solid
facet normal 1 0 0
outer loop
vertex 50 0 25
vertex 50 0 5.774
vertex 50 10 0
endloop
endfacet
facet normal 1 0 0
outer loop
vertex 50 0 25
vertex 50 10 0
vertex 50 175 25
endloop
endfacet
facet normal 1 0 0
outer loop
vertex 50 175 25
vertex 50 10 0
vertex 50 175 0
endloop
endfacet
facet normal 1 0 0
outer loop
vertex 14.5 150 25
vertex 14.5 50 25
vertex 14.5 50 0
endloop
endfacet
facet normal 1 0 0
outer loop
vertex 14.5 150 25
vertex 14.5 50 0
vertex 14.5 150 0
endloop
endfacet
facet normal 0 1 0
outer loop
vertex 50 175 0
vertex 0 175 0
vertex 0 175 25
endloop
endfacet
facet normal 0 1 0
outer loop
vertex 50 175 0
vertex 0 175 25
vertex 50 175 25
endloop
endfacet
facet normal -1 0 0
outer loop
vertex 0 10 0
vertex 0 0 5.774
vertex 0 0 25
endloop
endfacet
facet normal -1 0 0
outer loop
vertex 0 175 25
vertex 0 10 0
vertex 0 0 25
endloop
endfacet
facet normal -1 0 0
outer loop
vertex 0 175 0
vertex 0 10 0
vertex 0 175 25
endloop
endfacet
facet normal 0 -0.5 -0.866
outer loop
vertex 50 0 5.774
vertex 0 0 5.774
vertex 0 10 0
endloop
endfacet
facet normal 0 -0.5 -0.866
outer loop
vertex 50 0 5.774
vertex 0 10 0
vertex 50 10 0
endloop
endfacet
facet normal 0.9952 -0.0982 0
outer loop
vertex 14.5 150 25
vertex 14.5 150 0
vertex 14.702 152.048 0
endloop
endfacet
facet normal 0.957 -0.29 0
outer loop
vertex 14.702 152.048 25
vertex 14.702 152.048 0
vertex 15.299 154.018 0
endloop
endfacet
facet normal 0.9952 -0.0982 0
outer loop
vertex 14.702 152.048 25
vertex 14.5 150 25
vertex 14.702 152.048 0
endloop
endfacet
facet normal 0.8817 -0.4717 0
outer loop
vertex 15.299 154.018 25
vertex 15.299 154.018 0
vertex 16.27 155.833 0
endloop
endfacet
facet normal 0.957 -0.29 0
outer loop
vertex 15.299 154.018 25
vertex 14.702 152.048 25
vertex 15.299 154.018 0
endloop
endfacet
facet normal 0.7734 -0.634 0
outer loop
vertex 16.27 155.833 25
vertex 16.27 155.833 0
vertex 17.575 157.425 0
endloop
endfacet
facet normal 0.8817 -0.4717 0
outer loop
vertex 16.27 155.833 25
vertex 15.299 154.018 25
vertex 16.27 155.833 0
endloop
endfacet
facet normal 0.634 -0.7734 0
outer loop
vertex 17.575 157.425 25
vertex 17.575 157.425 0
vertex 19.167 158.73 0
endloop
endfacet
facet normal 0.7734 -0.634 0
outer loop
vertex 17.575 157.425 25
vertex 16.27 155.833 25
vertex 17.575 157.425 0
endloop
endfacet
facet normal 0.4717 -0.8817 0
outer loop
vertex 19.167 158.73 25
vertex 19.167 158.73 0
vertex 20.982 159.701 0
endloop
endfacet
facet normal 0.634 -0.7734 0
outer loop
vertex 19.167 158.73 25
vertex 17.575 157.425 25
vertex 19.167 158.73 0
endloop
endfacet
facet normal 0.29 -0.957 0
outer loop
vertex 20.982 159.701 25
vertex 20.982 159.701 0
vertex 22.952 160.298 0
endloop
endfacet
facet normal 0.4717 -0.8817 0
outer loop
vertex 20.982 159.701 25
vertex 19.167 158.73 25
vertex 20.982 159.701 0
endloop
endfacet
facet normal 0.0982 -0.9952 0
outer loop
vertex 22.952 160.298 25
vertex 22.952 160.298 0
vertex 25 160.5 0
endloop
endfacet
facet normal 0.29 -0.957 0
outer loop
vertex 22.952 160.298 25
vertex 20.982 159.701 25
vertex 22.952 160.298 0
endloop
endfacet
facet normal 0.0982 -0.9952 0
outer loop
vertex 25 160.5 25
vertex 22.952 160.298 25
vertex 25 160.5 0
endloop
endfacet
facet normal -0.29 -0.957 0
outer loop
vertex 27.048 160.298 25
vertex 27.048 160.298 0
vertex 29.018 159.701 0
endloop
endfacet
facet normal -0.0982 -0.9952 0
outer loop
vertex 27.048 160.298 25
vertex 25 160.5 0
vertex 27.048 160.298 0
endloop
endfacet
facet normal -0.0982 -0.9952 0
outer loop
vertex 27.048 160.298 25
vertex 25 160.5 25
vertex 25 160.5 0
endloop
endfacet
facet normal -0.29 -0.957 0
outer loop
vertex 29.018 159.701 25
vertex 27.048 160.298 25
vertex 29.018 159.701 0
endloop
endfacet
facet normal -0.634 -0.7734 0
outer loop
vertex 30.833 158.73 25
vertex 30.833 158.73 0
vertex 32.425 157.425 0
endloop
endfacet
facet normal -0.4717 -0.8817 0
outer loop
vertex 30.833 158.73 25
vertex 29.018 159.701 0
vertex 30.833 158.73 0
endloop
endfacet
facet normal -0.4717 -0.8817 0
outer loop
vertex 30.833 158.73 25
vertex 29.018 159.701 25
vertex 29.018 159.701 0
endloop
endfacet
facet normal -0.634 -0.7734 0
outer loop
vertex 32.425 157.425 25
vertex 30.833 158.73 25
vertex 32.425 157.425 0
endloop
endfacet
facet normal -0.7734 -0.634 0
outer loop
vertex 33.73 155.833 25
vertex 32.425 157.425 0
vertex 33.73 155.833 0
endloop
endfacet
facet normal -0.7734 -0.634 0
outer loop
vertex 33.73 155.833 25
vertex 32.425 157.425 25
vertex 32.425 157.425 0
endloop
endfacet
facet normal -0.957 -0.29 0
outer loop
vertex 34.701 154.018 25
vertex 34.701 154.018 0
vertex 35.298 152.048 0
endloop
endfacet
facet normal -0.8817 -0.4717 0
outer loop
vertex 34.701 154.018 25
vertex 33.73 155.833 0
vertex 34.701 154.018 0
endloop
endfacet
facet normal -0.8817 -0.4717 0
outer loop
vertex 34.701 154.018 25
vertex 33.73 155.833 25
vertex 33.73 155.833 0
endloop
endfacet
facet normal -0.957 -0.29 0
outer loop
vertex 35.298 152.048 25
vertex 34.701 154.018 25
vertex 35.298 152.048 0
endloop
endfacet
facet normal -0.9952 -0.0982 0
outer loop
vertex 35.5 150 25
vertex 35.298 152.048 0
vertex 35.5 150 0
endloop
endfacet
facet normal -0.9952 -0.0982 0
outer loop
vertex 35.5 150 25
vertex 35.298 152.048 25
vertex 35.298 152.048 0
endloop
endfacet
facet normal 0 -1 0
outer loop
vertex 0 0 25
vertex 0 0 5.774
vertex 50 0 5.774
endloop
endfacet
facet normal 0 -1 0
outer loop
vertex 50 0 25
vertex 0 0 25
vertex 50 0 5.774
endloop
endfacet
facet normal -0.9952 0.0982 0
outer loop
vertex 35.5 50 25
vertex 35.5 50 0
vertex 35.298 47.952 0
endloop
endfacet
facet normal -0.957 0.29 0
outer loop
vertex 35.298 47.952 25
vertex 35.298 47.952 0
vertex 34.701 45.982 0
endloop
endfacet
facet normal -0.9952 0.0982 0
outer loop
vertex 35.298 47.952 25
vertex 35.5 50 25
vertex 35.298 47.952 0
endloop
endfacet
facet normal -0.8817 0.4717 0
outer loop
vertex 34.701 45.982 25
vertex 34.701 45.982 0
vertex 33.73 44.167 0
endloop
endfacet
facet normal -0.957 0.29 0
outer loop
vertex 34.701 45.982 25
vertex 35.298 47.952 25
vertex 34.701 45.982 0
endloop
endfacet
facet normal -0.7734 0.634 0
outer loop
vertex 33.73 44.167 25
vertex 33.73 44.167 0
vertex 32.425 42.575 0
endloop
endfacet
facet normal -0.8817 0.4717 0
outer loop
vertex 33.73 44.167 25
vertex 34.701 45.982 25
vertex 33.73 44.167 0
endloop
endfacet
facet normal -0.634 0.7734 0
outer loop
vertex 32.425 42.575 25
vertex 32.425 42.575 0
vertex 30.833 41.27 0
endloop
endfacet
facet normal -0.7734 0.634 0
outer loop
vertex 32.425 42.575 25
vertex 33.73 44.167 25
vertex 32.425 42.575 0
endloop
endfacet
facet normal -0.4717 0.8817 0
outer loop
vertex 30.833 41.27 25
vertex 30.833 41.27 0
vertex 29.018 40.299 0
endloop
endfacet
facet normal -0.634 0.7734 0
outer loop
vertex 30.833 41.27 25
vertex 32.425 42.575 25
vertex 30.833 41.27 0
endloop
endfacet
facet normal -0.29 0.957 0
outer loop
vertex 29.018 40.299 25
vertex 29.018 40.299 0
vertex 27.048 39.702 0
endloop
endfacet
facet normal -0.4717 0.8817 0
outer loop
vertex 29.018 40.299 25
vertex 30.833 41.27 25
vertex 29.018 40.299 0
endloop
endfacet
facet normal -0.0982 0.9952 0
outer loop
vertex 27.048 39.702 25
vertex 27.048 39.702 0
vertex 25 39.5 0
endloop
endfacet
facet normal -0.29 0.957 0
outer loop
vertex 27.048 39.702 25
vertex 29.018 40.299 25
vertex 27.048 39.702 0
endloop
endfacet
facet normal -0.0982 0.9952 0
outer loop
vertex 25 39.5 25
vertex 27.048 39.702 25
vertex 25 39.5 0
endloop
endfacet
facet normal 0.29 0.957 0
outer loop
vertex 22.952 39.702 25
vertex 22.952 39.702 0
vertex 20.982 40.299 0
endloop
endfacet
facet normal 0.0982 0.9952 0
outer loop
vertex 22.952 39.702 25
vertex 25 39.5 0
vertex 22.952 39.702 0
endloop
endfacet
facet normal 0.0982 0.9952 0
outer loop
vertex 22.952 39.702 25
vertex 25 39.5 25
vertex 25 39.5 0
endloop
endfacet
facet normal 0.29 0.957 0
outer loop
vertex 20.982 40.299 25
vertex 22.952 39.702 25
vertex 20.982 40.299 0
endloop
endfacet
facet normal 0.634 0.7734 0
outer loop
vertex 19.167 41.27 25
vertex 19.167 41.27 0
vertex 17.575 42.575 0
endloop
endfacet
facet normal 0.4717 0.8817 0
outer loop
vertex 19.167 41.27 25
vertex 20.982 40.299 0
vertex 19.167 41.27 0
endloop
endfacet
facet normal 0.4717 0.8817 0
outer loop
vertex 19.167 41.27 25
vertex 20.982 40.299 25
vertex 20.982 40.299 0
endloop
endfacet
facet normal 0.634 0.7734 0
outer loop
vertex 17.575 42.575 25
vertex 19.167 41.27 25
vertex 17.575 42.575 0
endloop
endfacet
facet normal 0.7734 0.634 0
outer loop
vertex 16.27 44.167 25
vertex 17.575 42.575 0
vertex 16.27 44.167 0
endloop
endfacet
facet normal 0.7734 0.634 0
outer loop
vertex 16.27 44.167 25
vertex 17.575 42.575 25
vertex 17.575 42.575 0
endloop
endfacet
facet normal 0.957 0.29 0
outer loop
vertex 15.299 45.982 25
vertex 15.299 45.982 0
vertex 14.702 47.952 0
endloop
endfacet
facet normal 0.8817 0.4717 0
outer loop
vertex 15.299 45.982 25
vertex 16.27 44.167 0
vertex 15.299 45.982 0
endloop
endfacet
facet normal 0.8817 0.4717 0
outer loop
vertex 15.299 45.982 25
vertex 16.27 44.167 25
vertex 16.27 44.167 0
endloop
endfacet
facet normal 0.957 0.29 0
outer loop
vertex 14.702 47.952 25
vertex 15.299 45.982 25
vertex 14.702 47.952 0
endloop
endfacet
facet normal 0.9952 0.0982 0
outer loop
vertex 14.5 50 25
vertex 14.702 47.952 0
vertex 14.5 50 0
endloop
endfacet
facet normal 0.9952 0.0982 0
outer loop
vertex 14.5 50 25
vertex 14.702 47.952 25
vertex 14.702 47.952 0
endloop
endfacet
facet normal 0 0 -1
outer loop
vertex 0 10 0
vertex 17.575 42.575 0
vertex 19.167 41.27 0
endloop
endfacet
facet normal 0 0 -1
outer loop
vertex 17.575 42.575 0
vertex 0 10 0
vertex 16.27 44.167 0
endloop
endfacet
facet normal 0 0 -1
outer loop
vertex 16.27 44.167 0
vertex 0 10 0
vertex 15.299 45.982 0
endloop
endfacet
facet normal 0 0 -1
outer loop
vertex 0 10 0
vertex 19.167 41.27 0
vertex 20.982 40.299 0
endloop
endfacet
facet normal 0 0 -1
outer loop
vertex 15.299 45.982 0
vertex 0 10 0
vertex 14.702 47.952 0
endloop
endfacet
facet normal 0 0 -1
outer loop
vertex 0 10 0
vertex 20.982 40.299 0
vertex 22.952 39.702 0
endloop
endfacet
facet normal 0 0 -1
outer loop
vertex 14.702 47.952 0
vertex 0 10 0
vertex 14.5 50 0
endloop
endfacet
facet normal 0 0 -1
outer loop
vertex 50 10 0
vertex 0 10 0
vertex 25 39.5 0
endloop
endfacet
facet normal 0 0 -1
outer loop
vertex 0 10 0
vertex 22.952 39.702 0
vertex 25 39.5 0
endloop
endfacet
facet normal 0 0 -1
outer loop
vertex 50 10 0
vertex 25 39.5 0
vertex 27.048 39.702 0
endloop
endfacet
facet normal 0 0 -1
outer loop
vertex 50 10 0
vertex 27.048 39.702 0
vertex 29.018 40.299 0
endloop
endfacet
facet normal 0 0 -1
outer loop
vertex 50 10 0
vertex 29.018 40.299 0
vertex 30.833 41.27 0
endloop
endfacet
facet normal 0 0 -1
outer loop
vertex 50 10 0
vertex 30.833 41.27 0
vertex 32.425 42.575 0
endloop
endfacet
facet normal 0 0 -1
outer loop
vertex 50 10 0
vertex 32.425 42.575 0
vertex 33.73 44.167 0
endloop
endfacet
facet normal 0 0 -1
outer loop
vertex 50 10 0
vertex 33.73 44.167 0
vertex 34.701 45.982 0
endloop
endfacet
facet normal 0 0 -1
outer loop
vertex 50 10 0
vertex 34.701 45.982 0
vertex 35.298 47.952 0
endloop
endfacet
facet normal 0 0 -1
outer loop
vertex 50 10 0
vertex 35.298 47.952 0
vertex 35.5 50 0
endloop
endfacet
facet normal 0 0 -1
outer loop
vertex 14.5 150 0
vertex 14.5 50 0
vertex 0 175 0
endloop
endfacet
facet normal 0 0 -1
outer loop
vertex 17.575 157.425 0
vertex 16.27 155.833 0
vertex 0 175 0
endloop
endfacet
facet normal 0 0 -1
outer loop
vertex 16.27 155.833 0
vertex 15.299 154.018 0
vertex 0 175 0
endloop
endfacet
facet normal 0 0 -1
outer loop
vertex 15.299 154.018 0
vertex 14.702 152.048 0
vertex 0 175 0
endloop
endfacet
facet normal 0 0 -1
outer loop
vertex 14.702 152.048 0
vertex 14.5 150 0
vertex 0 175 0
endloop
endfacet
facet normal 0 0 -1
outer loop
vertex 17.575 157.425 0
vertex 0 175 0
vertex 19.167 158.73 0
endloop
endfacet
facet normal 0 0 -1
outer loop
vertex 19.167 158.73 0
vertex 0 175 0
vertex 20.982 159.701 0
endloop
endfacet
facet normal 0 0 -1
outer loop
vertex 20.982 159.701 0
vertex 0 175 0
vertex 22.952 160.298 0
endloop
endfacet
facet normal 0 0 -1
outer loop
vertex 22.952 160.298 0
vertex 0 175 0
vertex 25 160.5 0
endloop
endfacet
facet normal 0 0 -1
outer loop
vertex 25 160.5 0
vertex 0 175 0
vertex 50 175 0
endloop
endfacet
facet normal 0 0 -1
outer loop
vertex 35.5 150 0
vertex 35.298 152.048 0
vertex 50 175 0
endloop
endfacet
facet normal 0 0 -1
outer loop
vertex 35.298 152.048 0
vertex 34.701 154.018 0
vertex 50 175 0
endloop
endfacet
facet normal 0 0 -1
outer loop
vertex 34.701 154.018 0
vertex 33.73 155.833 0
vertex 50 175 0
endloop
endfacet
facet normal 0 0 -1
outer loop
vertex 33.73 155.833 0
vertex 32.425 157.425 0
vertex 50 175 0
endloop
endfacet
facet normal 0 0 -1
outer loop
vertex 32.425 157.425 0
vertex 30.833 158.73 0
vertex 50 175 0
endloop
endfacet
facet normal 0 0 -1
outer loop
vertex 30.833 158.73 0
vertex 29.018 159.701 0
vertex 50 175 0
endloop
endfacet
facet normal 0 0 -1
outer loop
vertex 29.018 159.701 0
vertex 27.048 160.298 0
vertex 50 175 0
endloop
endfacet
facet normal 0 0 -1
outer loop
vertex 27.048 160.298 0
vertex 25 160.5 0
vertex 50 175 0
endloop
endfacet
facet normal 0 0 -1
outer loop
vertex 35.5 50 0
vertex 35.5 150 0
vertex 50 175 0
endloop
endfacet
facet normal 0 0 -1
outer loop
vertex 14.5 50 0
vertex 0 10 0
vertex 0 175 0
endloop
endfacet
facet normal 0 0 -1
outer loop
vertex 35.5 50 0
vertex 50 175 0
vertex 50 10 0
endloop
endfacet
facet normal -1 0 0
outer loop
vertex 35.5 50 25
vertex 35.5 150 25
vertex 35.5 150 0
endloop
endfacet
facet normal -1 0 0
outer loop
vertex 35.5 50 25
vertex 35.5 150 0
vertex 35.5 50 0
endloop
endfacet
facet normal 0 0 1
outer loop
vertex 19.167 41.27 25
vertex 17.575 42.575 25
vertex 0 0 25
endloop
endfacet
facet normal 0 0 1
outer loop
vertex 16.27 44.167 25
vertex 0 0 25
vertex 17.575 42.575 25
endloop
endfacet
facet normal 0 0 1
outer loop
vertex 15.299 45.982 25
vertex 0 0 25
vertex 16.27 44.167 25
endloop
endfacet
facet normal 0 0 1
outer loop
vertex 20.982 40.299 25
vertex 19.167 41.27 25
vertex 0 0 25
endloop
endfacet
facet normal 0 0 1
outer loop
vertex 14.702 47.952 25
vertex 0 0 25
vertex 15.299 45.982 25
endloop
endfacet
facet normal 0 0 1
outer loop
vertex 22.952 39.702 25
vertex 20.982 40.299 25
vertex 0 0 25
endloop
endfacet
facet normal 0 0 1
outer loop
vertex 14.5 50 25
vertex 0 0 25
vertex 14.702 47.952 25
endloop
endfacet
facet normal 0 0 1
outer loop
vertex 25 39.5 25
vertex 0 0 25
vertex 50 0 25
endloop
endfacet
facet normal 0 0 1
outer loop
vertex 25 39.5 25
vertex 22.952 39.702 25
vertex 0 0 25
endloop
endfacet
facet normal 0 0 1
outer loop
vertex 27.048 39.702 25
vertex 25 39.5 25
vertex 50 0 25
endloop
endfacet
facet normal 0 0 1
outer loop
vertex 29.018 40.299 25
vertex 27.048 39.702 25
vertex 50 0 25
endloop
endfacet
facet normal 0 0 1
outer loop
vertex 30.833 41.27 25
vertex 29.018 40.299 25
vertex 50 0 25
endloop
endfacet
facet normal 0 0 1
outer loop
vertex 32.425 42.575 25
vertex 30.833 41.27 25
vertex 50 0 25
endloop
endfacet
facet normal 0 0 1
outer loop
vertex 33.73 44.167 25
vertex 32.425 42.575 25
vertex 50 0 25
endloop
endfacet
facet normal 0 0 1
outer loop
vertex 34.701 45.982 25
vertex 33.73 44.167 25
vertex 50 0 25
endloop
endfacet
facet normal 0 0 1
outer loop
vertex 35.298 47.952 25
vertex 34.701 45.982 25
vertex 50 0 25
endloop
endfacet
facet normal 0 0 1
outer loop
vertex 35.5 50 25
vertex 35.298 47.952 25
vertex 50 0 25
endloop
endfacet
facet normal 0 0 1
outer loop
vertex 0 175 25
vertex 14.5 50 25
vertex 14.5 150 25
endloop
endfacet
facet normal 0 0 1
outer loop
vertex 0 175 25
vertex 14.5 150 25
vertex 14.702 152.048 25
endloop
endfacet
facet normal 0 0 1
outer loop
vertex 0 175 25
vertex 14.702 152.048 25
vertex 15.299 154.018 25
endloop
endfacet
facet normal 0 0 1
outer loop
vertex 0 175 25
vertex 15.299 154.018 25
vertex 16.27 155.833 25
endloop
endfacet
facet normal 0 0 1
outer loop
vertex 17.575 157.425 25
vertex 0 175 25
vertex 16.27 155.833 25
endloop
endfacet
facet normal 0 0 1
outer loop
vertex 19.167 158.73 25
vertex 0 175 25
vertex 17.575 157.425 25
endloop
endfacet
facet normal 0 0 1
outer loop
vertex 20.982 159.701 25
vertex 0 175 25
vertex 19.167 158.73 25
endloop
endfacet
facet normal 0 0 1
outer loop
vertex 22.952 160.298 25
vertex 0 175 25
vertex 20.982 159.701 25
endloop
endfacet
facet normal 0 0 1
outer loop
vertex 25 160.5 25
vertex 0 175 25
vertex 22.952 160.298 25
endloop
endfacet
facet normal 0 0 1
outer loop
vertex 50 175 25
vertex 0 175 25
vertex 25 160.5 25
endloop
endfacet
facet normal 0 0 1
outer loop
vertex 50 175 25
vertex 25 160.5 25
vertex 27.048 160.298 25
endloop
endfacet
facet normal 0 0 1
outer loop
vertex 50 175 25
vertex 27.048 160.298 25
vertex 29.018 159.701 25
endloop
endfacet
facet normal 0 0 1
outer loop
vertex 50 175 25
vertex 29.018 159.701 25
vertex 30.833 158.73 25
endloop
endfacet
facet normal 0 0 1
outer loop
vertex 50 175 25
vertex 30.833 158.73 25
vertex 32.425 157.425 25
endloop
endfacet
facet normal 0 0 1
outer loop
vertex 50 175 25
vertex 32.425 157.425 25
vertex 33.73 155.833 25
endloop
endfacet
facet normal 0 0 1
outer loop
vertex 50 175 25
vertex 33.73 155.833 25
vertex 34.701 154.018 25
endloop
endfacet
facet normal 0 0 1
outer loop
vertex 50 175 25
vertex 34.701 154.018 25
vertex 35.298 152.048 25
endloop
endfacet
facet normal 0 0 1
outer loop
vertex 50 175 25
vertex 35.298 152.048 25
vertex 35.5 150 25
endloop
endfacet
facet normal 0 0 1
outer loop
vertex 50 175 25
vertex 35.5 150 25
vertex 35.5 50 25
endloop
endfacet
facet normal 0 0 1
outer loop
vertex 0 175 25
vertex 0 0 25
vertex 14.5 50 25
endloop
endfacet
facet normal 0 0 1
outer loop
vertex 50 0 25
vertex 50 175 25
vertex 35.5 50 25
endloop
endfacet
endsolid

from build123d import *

# Parameters (mm, degrees)
SKETCH_1_W          = 50
SKETCH_1_H          = 175
EXTRUDE_1_DEPTH     = 25
CUT_EXTRUDE_1_DEPTH = 26
CHAMFER_1_SIZE      = 10
CHAMFER_1_SIZE2     = 5.773502692


with BuildPart() as part:
    # Эскиз1 → Бобышка-Вытянуть1 (new body)
    with BuildSketch(Plane.XY):
        with Locations((25, 87.5)):
            Rectangle(SKETCH_1_W, SKETCH_1_H)
    extrude(amount=EXTRUDE_1_DEPTH)

    # Эскиз2 → Вырез-Вытянуть1 (cut, through all)
    with BuildSketch(Plane.XY.offset(25)):
        with BuildLine():
            Line((14.5, 50), (14.5, 150))
            ThreePointArc((14.5, 150), (25, 160.5), (35.5, 150))
            Line((35.5, 150), (35.5, 50))
            ThreePointArc((35.5, 50), (25, 39.5), (14.5, 50))
        make_face()
    extrude(amount=-CUT_EXTRUDE_1_DEPTH, mode=Mode.SUBTRACT)

    # Фаска1
    chamfer_1_edges = [part.edges().sort_by_distance(p)[0] for p in [
        (25, 0, 0),
    ]]
    chamfer_1_side = [part.faces().sort_by_distance(p)[0] for p in [
        (25, 1.820027472, 0),
    ]]
    chamfer(chamfer_1_edges, length=CHAMFER_1_SIZE, length2=CHAMFER_1_SIZE2, reference=chamfer_1_side[0])


solid = part.part
